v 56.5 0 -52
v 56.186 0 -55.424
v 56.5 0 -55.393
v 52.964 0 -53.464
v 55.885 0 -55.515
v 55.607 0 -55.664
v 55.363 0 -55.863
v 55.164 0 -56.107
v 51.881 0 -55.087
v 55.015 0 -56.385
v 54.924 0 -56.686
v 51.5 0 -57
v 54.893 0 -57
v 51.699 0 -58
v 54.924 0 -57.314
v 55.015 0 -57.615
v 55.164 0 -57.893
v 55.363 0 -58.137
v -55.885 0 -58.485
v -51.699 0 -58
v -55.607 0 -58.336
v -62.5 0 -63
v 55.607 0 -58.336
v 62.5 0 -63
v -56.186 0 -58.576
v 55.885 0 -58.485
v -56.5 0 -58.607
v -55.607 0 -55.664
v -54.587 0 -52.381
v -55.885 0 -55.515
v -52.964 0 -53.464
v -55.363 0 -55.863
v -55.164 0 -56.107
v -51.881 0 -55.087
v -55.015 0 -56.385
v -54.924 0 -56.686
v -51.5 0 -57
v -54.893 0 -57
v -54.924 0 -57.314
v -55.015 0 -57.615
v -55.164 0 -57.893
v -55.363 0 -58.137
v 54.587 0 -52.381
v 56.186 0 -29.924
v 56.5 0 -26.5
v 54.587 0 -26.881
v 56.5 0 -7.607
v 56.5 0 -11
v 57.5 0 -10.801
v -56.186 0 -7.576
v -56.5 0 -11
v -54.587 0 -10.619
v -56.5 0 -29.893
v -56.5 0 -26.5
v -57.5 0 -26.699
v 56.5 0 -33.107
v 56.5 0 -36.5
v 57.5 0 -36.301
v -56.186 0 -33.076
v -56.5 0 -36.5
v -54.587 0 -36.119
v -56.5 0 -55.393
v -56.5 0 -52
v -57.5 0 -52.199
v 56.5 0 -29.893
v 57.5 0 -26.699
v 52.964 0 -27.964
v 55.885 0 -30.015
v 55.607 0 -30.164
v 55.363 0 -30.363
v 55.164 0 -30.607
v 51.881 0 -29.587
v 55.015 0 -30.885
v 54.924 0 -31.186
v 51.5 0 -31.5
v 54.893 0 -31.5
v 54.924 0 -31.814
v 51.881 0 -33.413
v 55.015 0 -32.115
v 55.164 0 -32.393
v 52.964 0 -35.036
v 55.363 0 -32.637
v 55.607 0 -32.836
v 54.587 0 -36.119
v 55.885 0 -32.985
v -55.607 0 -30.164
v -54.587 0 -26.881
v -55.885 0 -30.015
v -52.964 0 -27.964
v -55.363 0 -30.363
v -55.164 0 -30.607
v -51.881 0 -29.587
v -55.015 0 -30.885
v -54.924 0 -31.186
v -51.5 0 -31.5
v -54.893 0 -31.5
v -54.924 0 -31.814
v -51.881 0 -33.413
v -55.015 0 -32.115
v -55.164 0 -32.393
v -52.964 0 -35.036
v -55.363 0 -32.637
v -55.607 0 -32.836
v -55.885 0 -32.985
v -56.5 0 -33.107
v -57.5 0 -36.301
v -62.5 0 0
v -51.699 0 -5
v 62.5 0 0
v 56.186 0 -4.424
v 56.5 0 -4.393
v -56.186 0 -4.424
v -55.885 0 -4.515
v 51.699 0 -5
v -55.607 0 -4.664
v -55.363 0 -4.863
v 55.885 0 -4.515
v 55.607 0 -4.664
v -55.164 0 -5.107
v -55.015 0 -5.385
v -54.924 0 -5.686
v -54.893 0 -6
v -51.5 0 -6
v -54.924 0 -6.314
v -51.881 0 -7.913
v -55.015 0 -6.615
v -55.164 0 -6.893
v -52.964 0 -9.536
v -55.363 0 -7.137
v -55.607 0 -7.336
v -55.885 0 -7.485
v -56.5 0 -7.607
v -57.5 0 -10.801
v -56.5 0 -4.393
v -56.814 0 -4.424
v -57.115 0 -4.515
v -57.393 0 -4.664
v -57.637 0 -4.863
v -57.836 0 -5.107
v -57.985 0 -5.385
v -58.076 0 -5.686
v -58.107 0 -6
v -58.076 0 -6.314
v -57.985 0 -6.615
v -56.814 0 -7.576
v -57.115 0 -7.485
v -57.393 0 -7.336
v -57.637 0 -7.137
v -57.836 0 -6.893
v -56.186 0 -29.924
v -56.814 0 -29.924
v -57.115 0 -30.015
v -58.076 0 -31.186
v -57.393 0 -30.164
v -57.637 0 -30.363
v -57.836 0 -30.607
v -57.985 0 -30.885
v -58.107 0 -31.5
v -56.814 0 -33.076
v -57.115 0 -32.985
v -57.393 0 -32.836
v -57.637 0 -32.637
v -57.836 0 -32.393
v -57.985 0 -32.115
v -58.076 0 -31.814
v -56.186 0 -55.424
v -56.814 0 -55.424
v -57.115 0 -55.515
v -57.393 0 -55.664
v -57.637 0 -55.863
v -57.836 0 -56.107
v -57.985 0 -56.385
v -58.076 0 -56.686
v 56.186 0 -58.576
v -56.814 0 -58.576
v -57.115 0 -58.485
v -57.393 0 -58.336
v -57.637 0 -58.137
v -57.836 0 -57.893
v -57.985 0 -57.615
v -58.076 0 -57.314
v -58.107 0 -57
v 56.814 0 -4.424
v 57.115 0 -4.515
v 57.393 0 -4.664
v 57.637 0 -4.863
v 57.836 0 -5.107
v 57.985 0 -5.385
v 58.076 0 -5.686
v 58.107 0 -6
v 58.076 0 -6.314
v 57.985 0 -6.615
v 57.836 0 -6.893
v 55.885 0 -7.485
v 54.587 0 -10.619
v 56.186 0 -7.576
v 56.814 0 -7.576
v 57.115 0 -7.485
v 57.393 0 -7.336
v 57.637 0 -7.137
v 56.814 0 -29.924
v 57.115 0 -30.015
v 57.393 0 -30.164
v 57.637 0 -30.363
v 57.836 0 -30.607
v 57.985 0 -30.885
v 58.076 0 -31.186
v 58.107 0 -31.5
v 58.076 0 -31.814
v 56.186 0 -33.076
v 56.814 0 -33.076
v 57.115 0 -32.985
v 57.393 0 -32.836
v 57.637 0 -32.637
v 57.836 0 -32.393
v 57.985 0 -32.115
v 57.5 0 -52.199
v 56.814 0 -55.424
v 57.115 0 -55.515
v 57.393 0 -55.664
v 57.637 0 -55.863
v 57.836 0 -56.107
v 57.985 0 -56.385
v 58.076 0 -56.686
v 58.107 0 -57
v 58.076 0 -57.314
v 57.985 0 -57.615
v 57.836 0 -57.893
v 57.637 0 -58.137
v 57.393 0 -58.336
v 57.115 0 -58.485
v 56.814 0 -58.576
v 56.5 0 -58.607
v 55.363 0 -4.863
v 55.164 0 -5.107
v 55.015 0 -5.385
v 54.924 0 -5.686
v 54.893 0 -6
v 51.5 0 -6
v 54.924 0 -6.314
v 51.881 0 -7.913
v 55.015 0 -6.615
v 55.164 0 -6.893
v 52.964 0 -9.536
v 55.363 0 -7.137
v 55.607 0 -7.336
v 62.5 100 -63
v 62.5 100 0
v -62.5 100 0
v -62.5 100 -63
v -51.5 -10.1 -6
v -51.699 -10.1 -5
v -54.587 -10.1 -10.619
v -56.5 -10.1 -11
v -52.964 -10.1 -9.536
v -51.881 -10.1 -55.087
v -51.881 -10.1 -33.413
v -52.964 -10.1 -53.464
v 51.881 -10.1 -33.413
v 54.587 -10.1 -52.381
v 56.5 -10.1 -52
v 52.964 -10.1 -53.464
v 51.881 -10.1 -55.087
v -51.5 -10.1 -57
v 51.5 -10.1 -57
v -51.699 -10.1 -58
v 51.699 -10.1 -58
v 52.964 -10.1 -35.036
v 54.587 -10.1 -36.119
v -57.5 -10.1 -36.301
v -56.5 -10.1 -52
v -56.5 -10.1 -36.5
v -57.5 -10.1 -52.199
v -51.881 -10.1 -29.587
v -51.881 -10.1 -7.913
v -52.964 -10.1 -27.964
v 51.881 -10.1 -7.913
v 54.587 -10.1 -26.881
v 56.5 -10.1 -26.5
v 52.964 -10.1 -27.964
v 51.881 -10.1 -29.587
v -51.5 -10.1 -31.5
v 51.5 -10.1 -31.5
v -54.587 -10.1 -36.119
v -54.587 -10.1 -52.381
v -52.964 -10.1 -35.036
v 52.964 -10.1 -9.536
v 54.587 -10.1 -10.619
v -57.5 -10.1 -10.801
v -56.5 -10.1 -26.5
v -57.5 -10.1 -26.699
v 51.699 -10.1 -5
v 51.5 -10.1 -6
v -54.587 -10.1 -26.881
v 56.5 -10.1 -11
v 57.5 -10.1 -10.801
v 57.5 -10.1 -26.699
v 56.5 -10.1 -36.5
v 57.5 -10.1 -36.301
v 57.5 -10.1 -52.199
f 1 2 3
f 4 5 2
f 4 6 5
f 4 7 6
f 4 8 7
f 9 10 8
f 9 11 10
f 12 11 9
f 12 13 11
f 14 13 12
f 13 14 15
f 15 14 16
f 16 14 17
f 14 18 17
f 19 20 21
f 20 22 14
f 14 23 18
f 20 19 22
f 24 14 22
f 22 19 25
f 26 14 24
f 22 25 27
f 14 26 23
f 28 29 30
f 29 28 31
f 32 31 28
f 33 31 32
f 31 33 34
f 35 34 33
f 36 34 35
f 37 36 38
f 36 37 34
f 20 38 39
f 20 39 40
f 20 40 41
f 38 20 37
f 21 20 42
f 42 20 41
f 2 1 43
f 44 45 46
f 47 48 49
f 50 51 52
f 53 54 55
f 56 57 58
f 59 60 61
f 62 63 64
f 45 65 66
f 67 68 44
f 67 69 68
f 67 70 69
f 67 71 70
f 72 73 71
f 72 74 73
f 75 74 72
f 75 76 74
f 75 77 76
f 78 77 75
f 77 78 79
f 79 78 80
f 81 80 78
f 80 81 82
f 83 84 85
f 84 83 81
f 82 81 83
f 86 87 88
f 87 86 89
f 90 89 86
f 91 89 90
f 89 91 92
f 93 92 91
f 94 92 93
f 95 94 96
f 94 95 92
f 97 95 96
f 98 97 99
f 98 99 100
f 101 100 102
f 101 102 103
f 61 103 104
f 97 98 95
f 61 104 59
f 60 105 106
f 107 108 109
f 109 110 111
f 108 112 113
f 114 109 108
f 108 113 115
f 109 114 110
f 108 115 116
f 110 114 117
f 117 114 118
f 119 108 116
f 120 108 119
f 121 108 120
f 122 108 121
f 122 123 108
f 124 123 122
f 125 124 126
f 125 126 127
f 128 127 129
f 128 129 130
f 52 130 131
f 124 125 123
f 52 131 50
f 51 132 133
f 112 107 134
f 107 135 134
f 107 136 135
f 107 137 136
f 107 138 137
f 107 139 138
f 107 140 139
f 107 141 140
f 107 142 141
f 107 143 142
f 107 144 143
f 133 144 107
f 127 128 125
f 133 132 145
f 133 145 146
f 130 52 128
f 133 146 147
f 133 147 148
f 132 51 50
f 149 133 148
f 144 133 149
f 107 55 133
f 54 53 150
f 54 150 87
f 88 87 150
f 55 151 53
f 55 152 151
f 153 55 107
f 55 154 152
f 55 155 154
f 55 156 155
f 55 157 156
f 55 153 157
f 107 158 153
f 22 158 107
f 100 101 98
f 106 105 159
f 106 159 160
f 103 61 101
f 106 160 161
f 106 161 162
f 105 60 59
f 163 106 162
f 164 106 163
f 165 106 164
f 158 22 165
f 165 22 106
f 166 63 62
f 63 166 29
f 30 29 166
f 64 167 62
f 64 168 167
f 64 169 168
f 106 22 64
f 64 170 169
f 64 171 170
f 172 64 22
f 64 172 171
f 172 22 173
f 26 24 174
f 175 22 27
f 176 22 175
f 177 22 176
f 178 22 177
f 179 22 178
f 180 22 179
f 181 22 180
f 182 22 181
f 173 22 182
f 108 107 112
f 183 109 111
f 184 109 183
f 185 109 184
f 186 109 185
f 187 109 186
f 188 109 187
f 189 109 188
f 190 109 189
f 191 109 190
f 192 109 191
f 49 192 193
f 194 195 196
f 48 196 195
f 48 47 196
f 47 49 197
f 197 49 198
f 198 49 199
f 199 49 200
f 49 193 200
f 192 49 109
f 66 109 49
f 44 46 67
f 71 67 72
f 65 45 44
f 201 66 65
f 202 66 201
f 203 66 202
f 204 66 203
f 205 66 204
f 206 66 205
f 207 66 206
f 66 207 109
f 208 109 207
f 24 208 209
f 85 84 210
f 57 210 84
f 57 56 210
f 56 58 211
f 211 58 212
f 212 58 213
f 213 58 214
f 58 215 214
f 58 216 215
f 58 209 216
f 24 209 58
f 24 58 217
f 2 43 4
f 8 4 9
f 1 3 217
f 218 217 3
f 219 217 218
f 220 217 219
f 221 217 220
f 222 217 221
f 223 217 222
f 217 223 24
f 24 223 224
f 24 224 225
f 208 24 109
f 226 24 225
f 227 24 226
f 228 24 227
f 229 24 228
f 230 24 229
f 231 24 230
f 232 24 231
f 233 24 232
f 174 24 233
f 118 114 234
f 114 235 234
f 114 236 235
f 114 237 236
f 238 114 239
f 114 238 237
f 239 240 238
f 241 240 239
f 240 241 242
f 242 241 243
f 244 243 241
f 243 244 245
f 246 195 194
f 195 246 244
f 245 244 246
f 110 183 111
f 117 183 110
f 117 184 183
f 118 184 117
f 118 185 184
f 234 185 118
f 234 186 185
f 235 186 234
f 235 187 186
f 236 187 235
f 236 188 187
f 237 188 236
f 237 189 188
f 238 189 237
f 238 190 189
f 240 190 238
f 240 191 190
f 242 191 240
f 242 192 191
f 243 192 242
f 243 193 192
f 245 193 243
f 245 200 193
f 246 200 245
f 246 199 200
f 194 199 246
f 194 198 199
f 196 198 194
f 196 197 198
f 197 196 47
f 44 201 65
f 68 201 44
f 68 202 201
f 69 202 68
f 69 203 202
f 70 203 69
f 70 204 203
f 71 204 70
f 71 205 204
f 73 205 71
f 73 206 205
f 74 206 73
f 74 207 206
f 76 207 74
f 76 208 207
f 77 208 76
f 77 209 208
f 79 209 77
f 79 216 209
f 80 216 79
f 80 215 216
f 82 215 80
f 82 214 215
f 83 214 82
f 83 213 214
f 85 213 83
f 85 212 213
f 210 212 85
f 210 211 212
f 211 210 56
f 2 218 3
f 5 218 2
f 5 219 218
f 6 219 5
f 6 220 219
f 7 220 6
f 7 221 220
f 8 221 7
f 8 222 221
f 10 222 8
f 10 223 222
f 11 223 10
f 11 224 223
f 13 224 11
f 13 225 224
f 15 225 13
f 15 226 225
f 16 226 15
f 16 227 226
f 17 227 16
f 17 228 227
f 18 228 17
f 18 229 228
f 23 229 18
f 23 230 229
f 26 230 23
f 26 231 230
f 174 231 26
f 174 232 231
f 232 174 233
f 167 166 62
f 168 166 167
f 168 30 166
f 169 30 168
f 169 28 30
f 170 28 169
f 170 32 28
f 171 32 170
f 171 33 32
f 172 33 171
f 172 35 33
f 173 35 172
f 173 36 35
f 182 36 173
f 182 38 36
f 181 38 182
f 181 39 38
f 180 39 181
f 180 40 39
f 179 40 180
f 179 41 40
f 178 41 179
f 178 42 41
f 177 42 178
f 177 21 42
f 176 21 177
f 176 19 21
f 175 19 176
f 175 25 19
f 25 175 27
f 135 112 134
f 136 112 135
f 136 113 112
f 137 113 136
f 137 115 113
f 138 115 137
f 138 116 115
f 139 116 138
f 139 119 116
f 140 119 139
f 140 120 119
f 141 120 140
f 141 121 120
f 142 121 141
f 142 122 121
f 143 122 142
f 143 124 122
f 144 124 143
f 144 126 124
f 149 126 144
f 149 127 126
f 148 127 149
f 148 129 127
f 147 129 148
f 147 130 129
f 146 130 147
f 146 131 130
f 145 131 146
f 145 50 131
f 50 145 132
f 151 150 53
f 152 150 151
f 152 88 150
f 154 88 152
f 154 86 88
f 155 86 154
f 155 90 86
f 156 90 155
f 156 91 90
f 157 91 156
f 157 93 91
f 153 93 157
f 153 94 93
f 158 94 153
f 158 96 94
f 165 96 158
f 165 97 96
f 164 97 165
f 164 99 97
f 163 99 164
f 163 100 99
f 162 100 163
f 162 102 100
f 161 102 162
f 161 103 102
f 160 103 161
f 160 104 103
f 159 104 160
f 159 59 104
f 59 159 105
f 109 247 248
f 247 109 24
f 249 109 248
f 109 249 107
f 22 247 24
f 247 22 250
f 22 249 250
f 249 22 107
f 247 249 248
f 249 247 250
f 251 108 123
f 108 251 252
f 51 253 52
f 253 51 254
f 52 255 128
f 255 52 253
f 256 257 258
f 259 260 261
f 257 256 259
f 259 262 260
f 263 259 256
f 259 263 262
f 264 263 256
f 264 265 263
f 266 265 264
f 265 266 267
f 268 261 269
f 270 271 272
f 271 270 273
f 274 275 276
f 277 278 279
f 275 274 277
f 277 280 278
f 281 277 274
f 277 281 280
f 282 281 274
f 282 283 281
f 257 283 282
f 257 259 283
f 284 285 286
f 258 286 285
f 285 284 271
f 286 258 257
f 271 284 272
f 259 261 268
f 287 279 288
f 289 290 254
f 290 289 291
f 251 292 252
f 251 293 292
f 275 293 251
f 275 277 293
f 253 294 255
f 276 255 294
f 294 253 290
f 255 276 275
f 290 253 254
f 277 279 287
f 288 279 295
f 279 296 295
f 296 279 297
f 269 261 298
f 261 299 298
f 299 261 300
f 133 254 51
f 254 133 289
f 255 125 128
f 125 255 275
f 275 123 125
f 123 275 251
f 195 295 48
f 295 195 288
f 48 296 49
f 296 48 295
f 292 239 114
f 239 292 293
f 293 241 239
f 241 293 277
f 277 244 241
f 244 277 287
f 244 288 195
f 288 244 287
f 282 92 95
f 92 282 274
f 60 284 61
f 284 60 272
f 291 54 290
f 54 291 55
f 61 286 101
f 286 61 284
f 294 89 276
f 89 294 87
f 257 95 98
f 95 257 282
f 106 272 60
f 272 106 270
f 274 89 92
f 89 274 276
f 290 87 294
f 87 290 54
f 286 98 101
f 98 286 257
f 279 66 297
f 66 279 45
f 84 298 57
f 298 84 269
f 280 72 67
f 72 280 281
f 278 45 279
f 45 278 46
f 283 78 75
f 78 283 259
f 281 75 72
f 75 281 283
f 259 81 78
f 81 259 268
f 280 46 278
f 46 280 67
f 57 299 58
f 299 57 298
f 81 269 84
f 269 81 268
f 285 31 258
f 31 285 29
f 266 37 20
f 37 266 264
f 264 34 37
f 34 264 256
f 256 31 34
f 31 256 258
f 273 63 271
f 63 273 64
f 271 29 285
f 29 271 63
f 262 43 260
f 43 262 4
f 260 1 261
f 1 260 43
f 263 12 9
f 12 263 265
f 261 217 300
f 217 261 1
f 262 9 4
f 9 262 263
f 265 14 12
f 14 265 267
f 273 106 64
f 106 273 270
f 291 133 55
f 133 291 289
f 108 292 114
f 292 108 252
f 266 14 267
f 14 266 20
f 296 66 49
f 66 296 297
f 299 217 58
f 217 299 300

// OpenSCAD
// file: zcube.scad
// This function creates a cube with a given x/y either above (f=1) or below (f=-1) the z axis.
module zcube(dimensions, z=0, f=1) {
	translate([0, 0, dimensions[2]/2 * f + z]) cube(dimensions, true);
}

module rcube(dimensions, d, z=0, f=1) {
	dx = dimensions[0]/2 - d/2;
	dy = dimensions[1]/2 - d/2;
	dz = dimensions[2]/2 * (f-1) + z;
	
	hull() {
		translate([-dx, -dy, dz]) cylinder(h=dimensions[2], d=d);
		translate([-dx, dy, dz]) cylinder(h=dimensions[2], d=d);
		translate([dx, -dy, dz]) cylinder(h=dimensions[2], d=d);
		translate([dx, dy, dz]) cylinder(h=dimensions[2], d=d);
	}
}

module zcorners() {
	children();
	mirror([1, 0, 0]) children();
	mirror([0, 1, 0]) children();
	mirror([1, 1, 0]) children();
}
// file: bolts.scad
$radial_error = 0.1;
$fn = 32;

module cylinder_outer(height, radius, fn=$fn, radial_error=$radial_error) {
	fudge = 1/cos(180/fn);
	cylinder(h=height,r=radius*fudge+$radial_error, $fn=fn);
}

module cylinder_inner(height, radius, fn=$fn) {
	cylinder(h=height,r=radius-$radial_error,$fn=fn);
}

// Make a hole for a bolt/screw combination.
module bolt(diameter=3, depth=8, nut_offset=2, shaft_length=10, inset=10) {
	hole(diameter, depth, inset);
	hull() {
		shaft_width = diameter;
		translate([0, 0, nut_offset]) rotate(360/12, [0, 0, 1]) cylinder_outer(diameter, shaft_width, 6);
		translate([0, shaft_length, nut_offset]) rotate(360/12, [0, 0, 1]) cylinder_outer(diameter, shaft_width, 6);
	}
}

// Make a hole. The diameter is the size of the screw (e.g. 3 for M3). Depth is how far the hole should go for the thread, and inset is how far out there should be a hole for the head to go.
module hole(diameter=3, depth=6, inset=10) {
	cylinder_outer(depth, diameter/2);
	translate([0, 0, depth]) cylinder_outer(inset, diameter, 32);
}

module countersunk_hole(diameter=3, depth=6, inset=10) {
	hole(diameter, depth, inset);
	translate([0, 0, depth-diameter/2]) cylinder(r1=diameter/2+$radial_error, r2=diameter+$radial_error, h=diameter/2);
}

module threaded_countersunk_hole(diameter=3, depth=6, inset=10) {
	hole(diameter*0.9, depth, inset);
	translate([0, 0, depth-diameter/2]) cylinder(r1=diameter/2+$radial_error, r2=diameter+$radial_error, h=diameter/2);
}

module countersunk_bolt(diameter=3, depth=8, nut_offset=2, shaft_length=10, inset=10) {
	countersunk_hole(diameter, depth, inset);
	hull() {
		shaft_width = diameter;
		translate([0, 0, nut_offset]) rotate(360/12, [0, 0, 1]) cylinder_outer(diameter, shaft_width, 6);
		translate([0, shaft_length, nut_offset]) rotate(360/12, [0, 0, 1]) cylinder_outer(diameter, shaft_width, 6);
	}
}

module mounting_hole(diameter=3, depth=6, inset=10, outset=3) {
	difference() {
		cylinder_outer(depth, diameter/2+outset);
		hole(diameter=diameter, depth=depth, inset=inset);
	}
}

rotate(90, [1, 0, 0]) difference() {
	cube([30, 10, 10]);
	translate([5, 5, 0]) bolt(diameter=3, depth=8);
	translate([15, 5, 0]) bolt(diameter=4, depth=8);
	translate([25, 5, 0]) countersunk_hole(diameter=4, depth=8);
}
// main file
use <bolts.scad>;
use <zcube.scad>;

module sx500g() {
	difference() {
		// http://silverstonetek.com/goods_cable_define/sx500-g-cable-define.pdf
		color("grey") translate([-125/2, 0, -63]) cube([125, 100, 63]);
		sx500g_holes() rotate(90, [1, 0, 0]) hole(3, 10);
	}
}

module sx500g_holes(inset = 6, width = 125, height = 63) {
	translate([-width/2+inset, 0, -inset]) children();
	translate([width/2-inset, 0, -inset]) children();
	
	// TODO I don't know if this is correct.. 
	translate([-width/2+inset, 0, -height/2]) children();
	translate([width/2-inset, 0, -height/2]) children();
	
	translate([-width/2+inset, 0, inset-height]) children();
	translate([width/2-inset, 0, inset-height]) children();
}

module sx500g_cutout(thickness = 10, inset = 10) {
	render() difference() {
		color("grey") translate([0, 0.1, -63/2]) rotate([90, 0, 0]) zcube([125-inset, 63-inset, thickness+0.2]);
		sx500g_holes() rotate([90, 0, 0]) cylinder(d=10, h=thickness+0.1);
		
		#sx500g_holes() translate([0, 30-thickness, 0]) rotate([90, 0, 0]) hole(3, 30);
	}
}

sx500g();
color("red") sx500g_cutout();
